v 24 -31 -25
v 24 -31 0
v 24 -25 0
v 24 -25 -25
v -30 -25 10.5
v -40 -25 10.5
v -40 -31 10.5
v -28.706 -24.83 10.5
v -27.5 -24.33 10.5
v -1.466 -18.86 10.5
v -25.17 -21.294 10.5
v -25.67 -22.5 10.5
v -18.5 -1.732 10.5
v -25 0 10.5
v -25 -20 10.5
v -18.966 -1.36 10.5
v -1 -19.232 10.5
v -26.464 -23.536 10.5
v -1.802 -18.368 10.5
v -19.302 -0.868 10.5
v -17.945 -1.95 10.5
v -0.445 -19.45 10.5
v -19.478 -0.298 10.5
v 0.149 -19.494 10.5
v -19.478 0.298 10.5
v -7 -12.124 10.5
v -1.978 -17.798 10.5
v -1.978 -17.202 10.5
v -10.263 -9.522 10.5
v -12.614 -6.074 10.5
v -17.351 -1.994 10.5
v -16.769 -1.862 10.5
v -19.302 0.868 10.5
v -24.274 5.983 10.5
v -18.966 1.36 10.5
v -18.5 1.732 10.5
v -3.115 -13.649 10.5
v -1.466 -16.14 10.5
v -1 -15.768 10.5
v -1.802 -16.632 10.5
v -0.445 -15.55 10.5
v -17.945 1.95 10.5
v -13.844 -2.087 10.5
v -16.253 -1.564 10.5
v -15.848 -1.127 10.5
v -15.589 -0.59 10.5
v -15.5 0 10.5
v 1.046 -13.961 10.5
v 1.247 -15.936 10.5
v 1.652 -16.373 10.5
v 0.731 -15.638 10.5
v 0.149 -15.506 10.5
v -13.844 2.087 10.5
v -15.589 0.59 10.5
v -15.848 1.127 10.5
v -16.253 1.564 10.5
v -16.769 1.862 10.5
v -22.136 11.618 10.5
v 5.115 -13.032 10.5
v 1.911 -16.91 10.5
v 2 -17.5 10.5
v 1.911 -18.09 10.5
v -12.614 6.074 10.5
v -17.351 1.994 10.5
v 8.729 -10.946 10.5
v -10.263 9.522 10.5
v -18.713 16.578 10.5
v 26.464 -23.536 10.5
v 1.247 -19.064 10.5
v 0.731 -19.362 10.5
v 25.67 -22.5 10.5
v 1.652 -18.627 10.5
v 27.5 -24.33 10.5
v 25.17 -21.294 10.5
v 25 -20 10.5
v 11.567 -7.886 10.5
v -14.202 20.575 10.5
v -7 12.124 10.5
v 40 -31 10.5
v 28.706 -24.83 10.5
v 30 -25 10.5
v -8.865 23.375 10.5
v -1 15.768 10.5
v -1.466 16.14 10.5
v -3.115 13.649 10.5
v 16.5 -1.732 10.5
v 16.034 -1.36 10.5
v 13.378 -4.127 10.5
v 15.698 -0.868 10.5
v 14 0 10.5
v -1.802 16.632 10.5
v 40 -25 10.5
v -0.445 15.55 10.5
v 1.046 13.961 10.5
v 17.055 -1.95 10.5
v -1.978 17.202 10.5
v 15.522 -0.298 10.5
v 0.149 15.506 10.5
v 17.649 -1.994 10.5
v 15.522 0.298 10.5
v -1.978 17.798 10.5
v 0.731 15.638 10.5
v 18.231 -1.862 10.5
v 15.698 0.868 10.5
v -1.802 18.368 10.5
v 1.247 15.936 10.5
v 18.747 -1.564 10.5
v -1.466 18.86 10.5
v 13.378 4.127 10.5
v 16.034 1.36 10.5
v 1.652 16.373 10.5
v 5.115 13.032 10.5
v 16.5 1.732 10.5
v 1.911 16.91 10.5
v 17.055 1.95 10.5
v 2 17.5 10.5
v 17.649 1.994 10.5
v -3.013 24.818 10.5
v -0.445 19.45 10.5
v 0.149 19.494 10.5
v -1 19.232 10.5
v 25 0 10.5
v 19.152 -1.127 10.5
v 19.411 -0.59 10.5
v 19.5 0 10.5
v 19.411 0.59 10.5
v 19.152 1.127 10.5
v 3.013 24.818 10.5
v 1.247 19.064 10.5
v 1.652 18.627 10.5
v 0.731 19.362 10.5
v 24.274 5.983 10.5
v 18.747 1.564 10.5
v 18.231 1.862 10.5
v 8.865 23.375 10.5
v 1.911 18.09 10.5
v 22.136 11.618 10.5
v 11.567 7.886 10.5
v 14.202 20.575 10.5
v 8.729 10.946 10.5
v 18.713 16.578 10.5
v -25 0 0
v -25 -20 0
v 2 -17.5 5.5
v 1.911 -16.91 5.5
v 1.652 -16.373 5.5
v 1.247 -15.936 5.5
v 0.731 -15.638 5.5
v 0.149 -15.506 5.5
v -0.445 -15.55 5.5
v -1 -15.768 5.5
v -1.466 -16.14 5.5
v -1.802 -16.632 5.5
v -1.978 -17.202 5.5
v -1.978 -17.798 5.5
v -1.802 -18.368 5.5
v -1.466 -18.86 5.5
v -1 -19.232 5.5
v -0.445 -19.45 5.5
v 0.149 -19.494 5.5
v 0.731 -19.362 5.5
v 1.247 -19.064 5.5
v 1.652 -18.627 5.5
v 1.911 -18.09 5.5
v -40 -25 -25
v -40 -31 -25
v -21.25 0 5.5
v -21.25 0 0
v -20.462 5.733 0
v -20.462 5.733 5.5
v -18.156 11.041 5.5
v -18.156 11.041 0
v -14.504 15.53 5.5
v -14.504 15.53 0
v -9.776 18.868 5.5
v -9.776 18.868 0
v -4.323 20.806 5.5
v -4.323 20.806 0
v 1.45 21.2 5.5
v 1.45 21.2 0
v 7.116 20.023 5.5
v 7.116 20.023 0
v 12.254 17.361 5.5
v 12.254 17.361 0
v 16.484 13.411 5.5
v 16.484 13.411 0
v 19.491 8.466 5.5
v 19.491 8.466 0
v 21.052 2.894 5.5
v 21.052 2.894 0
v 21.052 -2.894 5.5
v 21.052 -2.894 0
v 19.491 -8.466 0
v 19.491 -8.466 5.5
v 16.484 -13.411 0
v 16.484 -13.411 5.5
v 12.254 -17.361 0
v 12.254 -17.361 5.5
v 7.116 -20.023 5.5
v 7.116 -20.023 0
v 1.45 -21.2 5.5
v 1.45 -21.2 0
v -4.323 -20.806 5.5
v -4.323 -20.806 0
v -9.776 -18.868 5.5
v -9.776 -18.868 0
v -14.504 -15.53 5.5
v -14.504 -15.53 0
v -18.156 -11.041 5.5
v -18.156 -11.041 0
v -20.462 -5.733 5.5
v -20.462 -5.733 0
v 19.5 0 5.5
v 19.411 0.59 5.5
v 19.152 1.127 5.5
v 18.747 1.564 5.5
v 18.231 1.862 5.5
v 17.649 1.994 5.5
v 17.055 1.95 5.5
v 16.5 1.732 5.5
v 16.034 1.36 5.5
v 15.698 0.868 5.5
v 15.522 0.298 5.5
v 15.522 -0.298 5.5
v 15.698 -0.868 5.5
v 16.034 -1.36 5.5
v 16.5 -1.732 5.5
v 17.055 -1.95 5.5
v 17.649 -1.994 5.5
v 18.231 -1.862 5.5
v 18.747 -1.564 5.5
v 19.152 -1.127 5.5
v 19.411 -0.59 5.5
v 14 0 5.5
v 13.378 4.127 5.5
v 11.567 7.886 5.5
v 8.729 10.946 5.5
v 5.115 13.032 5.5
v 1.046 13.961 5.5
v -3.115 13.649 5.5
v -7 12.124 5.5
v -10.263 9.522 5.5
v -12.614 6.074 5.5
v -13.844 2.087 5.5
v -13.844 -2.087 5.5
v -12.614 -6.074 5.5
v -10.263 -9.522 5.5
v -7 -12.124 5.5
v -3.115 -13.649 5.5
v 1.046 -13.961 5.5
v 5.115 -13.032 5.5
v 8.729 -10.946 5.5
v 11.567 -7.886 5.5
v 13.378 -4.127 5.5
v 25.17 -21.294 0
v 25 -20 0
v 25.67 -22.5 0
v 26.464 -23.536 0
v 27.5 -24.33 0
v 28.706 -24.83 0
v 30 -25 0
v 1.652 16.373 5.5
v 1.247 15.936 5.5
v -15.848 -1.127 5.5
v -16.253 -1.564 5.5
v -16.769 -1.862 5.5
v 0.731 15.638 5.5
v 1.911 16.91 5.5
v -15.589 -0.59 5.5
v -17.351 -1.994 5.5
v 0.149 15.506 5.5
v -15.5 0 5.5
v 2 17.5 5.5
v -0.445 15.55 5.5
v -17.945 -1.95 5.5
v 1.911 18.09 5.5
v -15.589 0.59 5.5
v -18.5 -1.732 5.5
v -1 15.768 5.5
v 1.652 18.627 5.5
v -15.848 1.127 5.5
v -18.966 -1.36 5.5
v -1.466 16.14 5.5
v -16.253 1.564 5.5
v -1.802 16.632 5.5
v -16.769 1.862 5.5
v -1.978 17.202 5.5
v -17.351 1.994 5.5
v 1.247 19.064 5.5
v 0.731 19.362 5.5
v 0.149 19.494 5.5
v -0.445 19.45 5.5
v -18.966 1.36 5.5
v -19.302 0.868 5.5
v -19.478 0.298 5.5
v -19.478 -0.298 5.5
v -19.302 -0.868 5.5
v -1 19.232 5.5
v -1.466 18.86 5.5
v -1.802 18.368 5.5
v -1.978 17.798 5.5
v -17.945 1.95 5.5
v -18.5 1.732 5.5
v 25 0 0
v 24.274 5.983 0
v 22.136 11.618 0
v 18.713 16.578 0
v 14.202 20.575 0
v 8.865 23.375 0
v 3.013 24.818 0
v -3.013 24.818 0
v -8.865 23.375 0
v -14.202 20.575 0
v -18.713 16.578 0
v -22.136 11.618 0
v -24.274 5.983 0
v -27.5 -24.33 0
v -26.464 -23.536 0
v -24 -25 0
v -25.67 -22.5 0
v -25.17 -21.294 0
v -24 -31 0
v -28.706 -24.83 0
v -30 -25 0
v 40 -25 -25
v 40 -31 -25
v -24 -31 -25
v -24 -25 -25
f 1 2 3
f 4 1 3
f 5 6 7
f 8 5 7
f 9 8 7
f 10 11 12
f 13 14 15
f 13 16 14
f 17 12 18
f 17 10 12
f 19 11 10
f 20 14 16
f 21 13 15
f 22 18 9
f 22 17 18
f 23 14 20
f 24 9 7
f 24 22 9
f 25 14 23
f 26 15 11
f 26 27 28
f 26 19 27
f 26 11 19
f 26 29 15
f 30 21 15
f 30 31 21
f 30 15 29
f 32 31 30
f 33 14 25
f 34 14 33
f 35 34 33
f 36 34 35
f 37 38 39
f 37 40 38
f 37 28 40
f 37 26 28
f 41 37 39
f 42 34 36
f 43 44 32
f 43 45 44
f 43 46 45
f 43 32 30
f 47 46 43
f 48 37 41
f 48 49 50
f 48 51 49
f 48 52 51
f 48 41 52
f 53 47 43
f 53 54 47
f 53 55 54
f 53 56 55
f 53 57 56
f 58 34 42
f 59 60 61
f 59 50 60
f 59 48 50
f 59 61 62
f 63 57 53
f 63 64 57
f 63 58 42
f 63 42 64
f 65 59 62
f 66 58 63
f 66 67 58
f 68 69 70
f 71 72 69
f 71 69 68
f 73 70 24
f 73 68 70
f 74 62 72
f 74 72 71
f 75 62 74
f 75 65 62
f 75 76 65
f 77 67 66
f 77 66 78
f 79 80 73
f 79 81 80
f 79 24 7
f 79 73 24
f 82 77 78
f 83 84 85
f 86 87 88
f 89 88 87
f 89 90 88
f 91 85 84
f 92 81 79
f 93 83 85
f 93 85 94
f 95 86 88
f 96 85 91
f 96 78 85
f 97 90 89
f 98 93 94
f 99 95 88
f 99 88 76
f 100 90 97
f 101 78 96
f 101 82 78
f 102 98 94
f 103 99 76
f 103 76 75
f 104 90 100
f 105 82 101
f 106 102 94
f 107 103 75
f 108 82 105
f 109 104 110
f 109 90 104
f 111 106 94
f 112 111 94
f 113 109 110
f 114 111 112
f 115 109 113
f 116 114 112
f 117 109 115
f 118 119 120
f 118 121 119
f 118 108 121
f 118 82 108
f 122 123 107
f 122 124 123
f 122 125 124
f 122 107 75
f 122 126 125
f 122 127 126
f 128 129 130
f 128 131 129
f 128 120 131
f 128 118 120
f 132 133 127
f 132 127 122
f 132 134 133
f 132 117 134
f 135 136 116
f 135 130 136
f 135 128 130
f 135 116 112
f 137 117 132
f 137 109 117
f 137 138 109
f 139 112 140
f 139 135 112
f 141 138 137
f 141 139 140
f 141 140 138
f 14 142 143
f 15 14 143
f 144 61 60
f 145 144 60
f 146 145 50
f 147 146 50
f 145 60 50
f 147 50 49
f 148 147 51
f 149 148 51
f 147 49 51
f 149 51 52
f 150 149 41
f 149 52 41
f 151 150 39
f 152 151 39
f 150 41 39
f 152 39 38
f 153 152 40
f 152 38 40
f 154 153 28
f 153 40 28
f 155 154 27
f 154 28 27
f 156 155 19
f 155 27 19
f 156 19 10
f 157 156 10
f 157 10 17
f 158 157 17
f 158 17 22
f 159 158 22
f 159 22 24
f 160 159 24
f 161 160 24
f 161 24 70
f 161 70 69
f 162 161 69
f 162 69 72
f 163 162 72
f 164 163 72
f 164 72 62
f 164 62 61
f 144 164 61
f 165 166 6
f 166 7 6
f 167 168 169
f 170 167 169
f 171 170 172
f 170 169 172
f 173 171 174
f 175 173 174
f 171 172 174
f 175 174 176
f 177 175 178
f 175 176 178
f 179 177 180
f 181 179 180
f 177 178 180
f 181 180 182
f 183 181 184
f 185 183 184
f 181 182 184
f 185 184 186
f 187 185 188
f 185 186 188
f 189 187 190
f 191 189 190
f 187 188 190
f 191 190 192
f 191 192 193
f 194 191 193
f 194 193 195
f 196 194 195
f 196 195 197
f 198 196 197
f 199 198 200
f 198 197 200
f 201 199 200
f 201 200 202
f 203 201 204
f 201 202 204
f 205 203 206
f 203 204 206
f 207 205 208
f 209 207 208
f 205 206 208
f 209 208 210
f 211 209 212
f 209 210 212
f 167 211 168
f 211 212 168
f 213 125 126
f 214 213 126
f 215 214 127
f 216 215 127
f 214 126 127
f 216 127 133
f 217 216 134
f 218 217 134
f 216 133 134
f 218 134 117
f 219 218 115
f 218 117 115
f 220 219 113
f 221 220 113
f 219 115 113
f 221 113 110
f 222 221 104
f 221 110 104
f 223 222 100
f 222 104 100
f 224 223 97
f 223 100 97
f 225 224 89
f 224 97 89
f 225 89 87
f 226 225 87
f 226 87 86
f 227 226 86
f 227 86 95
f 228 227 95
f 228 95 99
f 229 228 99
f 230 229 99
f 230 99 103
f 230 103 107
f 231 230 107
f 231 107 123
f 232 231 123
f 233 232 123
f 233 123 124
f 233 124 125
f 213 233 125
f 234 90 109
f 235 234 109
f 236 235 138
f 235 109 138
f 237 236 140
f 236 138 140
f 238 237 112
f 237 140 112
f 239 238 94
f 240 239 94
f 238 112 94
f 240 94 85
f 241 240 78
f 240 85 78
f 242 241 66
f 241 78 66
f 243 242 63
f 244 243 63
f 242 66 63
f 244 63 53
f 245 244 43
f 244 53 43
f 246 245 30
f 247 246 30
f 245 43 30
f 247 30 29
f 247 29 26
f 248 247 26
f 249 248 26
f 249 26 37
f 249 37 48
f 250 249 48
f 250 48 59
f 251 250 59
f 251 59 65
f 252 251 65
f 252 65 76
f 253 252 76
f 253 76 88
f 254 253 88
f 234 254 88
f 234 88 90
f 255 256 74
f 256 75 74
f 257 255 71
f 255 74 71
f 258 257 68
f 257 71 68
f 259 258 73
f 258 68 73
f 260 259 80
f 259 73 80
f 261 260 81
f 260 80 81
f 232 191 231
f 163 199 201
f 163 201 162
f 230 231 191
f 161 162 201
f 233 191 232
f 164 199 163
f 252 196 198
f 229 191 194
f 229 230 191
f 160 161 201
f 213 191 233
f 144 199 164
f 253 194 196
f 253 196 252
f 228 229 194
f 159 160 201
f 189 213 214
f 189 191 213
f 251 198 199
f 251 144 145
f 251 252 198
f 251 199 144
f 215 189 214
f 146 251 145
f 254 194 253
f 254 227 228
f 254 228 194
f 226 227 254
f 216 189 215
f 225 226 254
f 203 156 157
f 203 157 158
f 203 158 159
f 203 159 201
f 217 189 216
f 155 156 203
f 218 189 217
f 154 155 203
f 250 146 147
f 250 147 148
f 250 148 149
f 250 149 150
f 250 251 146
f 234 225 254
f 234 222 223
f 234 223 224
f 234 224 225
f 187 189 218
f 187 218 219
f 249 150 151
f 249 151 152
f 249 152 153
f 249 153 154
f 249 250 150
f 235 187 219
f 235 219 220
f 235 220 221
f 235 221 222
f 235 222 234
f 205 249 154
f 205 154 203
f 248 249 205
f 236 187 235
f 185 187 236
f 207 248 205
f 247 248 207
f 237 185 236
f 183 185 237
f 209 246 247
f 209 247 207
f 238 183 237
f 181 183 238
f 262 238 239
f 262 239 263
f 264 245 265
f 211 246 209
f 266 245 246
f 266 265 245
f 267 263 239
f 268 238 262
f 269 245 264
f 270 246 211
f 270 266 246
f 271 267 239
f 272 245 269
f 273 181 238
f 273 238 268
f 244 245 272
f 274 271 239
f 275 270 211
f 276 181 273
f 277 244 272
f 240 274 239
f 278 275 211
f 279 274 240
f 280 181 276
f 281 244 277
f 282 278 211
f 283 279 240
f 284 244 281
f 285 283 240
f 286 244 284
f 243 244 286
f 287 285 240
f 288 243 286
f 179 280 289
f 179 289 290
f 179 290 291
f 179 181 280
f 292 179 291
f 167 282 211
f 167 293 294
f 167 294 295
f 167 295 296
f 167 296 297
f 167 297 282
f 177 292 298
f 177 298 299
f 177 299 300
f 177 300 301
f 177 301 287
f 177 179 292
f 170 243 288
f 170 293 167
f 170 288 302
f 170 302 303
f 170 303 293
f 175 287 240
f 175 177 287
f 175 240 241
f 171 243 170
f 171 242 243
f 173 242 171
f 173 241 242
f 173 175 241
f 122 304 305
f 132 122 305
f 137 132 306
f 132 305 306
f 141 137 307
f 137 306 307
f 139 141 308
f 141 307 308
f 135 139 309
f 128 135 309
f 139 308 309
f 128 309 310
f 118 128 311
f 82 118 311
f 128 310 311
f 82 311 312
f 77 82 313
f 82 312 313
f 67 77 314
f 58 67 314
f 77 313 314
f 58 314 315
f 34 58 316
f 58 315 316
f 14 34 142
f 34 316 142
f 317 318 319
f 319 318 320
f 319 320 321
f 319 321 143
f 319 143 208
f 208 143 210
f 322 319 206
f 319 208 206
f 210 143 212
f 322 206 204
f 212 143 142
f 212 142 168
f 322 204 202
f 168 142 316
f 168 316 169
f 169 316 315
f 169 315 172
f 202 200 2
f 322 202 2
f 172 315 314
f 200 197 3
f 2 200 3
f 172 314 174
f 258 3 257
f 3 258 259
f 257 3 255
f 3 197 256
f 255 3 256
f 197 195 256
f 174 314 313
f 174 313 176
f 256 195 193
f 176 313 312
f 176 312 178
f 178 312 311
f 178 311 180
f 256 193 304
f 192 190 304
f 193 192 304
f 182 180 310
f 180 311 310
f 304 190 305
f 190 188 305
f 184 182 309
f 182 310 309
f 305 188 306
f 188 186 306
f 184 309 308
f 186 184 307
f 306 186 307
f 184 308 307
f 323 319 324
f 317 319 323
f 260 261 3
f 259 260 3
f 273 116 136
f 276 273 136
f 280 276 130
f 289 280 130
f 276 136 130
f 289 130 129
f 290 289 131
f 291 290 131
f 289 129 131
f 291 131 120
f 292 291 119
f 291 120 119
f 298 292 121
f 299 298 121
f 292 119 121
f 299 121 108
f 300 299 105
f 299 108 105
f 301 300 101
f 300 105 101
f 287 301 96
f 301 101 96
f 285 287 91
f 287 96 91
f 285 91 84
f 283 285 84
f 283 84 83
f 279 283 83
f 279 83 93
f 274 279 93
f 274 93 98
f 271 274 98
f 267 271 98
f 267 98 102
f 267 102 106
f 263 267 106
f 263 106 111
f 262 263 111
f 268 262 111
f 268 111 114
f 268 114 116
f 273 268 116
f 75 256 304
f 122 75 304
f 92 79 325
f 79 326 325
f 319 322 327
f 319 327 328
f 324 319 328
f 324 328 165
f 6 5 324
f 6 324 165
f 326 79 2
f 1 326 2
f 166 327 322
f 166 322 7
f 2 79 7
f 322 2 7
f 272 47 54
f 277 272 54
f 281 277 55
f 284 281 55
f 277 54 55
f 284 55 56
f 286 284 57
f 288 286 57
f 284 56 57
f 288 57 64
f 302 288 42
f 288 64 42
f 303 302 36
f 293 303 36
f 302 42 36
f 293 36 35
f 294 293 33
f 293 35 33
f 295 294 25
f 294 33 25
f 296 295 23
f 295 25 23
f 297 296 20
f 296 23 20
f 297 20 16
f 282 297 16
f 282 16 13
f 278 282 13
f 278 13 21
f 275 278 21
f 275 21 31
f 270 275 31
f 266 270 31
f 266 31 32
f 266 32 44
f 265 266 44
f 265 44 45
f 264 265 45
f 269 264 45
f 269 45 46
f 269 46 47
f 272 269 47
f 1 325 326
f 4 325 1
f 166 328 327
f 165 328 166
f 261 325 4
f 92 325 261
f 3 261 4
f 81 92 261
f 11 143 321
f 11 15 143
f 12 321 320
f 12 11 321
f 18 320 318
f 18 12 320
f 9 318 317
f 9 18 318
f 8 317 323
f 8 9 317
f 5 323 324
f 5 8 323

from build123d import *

# Parameters (mm, degrees)
EXTRUDE_1_DEPTH     = 10.5
SKETCH_2_R          = 14
CUT_EXTRUDE_1_DEPTH = 52.684136831
SKETCH_3_R          = 21.25
CUT_EXTRUDE_2_DEPTH = 5.5
SKETCH_4_R          = 2
CUT_EXTRUDE_3_DEPTH = 52.684136831
FILLET_1_R          = 5
SKETCH_5_W          = 16
SKETCH_5_H          = 6
EXTRUDE_2_DEPTH     = 25


with BuildPart() as part:
    # 草图1 → 凸台-拉伸1 (new body)
    with BuildSketch(Plane.XY):
        with BuildLine():
            Line((-25, 0), (-25, -25))
            Line((-25, -25), (-40, -25))
            Line((-40, -25), (-40, -31))
            Line((-40, -31), (40, -31))
            Line((40, -31), (40, -25))
            Line((40, -25), (25, -25))
            Line((25, -25), (25, 0))
            ThreePointArc((25, 0), (0, 25), (-25, 0))
        make_face()
    extrude(amount=EXTRUDE_1_DEPTH)

    # 草图2 → 切除-拉伸1 (cut, through all)
    with BuildSketch(Plane.XY.offset(10.5)):
        Circle(SKETCH_2_R)
    extrude(amount=-CUT_EXTRUDE_1_DEPTH, mode=Mode.SUBTRACT)

    # 草图3 → 切除-拉伸2 (cut)
    with BuildSketch(Plane(origin=(0, 0, 0), x_dir=(-1, 0, 0), z_dir=(0, 0, -1))):
        Circle(SKETCH_3_R)
    extrude(amount=-CUT_EXTRUDE_2_DEPTH, mode=Mode.SUBTRACT)

    # 草图4 → 切除-拉伸3 (cut, through all)
    with BuildSketch(Plane.XY.offset(10.5)):
        with Locations((0, 17.5)):
            Circle(SKETCH_4_R)
        with Locations((17.5, 0)):
            Circle(SKETCH_4_R)
        with Locations((0, -17.5)):
            Circle(SKETCH_4_R)
        with Locations((-17.5, 0)):
            Circle(SKETCH_4_R)
    extrude(amount=-CUT_EXTRUDE_3_DEPTH, mode=Mode.SUBTRACT)

    # 圆角1
    fillet_1_edges = [part.edges().sort_by_distance(p)[0] for p in [
        (25, -25, 5.25),
        (-25, -25, 5.25),
    ]]
    fillet(fillet_1_edges, radius=FILLET_1_R)

    # 草图5 → 凸台-拉伸2 (add)
    with BuildSketch(Plane(origin=(0, 0, 0), x_dir=(-1, 0, 0), z_dir=(0, 0, -1))):
        with Locations((32, -28)):
            Rectangle(SKETCH_5_W, SKETCH_5_H)
        with Locations((-32, -28)):
            Rectangle(SKETCH_5_W, SKETCH_5_H)
    extrude(amount=EXTRUDE_2_DEPTH)


solid = part.part
